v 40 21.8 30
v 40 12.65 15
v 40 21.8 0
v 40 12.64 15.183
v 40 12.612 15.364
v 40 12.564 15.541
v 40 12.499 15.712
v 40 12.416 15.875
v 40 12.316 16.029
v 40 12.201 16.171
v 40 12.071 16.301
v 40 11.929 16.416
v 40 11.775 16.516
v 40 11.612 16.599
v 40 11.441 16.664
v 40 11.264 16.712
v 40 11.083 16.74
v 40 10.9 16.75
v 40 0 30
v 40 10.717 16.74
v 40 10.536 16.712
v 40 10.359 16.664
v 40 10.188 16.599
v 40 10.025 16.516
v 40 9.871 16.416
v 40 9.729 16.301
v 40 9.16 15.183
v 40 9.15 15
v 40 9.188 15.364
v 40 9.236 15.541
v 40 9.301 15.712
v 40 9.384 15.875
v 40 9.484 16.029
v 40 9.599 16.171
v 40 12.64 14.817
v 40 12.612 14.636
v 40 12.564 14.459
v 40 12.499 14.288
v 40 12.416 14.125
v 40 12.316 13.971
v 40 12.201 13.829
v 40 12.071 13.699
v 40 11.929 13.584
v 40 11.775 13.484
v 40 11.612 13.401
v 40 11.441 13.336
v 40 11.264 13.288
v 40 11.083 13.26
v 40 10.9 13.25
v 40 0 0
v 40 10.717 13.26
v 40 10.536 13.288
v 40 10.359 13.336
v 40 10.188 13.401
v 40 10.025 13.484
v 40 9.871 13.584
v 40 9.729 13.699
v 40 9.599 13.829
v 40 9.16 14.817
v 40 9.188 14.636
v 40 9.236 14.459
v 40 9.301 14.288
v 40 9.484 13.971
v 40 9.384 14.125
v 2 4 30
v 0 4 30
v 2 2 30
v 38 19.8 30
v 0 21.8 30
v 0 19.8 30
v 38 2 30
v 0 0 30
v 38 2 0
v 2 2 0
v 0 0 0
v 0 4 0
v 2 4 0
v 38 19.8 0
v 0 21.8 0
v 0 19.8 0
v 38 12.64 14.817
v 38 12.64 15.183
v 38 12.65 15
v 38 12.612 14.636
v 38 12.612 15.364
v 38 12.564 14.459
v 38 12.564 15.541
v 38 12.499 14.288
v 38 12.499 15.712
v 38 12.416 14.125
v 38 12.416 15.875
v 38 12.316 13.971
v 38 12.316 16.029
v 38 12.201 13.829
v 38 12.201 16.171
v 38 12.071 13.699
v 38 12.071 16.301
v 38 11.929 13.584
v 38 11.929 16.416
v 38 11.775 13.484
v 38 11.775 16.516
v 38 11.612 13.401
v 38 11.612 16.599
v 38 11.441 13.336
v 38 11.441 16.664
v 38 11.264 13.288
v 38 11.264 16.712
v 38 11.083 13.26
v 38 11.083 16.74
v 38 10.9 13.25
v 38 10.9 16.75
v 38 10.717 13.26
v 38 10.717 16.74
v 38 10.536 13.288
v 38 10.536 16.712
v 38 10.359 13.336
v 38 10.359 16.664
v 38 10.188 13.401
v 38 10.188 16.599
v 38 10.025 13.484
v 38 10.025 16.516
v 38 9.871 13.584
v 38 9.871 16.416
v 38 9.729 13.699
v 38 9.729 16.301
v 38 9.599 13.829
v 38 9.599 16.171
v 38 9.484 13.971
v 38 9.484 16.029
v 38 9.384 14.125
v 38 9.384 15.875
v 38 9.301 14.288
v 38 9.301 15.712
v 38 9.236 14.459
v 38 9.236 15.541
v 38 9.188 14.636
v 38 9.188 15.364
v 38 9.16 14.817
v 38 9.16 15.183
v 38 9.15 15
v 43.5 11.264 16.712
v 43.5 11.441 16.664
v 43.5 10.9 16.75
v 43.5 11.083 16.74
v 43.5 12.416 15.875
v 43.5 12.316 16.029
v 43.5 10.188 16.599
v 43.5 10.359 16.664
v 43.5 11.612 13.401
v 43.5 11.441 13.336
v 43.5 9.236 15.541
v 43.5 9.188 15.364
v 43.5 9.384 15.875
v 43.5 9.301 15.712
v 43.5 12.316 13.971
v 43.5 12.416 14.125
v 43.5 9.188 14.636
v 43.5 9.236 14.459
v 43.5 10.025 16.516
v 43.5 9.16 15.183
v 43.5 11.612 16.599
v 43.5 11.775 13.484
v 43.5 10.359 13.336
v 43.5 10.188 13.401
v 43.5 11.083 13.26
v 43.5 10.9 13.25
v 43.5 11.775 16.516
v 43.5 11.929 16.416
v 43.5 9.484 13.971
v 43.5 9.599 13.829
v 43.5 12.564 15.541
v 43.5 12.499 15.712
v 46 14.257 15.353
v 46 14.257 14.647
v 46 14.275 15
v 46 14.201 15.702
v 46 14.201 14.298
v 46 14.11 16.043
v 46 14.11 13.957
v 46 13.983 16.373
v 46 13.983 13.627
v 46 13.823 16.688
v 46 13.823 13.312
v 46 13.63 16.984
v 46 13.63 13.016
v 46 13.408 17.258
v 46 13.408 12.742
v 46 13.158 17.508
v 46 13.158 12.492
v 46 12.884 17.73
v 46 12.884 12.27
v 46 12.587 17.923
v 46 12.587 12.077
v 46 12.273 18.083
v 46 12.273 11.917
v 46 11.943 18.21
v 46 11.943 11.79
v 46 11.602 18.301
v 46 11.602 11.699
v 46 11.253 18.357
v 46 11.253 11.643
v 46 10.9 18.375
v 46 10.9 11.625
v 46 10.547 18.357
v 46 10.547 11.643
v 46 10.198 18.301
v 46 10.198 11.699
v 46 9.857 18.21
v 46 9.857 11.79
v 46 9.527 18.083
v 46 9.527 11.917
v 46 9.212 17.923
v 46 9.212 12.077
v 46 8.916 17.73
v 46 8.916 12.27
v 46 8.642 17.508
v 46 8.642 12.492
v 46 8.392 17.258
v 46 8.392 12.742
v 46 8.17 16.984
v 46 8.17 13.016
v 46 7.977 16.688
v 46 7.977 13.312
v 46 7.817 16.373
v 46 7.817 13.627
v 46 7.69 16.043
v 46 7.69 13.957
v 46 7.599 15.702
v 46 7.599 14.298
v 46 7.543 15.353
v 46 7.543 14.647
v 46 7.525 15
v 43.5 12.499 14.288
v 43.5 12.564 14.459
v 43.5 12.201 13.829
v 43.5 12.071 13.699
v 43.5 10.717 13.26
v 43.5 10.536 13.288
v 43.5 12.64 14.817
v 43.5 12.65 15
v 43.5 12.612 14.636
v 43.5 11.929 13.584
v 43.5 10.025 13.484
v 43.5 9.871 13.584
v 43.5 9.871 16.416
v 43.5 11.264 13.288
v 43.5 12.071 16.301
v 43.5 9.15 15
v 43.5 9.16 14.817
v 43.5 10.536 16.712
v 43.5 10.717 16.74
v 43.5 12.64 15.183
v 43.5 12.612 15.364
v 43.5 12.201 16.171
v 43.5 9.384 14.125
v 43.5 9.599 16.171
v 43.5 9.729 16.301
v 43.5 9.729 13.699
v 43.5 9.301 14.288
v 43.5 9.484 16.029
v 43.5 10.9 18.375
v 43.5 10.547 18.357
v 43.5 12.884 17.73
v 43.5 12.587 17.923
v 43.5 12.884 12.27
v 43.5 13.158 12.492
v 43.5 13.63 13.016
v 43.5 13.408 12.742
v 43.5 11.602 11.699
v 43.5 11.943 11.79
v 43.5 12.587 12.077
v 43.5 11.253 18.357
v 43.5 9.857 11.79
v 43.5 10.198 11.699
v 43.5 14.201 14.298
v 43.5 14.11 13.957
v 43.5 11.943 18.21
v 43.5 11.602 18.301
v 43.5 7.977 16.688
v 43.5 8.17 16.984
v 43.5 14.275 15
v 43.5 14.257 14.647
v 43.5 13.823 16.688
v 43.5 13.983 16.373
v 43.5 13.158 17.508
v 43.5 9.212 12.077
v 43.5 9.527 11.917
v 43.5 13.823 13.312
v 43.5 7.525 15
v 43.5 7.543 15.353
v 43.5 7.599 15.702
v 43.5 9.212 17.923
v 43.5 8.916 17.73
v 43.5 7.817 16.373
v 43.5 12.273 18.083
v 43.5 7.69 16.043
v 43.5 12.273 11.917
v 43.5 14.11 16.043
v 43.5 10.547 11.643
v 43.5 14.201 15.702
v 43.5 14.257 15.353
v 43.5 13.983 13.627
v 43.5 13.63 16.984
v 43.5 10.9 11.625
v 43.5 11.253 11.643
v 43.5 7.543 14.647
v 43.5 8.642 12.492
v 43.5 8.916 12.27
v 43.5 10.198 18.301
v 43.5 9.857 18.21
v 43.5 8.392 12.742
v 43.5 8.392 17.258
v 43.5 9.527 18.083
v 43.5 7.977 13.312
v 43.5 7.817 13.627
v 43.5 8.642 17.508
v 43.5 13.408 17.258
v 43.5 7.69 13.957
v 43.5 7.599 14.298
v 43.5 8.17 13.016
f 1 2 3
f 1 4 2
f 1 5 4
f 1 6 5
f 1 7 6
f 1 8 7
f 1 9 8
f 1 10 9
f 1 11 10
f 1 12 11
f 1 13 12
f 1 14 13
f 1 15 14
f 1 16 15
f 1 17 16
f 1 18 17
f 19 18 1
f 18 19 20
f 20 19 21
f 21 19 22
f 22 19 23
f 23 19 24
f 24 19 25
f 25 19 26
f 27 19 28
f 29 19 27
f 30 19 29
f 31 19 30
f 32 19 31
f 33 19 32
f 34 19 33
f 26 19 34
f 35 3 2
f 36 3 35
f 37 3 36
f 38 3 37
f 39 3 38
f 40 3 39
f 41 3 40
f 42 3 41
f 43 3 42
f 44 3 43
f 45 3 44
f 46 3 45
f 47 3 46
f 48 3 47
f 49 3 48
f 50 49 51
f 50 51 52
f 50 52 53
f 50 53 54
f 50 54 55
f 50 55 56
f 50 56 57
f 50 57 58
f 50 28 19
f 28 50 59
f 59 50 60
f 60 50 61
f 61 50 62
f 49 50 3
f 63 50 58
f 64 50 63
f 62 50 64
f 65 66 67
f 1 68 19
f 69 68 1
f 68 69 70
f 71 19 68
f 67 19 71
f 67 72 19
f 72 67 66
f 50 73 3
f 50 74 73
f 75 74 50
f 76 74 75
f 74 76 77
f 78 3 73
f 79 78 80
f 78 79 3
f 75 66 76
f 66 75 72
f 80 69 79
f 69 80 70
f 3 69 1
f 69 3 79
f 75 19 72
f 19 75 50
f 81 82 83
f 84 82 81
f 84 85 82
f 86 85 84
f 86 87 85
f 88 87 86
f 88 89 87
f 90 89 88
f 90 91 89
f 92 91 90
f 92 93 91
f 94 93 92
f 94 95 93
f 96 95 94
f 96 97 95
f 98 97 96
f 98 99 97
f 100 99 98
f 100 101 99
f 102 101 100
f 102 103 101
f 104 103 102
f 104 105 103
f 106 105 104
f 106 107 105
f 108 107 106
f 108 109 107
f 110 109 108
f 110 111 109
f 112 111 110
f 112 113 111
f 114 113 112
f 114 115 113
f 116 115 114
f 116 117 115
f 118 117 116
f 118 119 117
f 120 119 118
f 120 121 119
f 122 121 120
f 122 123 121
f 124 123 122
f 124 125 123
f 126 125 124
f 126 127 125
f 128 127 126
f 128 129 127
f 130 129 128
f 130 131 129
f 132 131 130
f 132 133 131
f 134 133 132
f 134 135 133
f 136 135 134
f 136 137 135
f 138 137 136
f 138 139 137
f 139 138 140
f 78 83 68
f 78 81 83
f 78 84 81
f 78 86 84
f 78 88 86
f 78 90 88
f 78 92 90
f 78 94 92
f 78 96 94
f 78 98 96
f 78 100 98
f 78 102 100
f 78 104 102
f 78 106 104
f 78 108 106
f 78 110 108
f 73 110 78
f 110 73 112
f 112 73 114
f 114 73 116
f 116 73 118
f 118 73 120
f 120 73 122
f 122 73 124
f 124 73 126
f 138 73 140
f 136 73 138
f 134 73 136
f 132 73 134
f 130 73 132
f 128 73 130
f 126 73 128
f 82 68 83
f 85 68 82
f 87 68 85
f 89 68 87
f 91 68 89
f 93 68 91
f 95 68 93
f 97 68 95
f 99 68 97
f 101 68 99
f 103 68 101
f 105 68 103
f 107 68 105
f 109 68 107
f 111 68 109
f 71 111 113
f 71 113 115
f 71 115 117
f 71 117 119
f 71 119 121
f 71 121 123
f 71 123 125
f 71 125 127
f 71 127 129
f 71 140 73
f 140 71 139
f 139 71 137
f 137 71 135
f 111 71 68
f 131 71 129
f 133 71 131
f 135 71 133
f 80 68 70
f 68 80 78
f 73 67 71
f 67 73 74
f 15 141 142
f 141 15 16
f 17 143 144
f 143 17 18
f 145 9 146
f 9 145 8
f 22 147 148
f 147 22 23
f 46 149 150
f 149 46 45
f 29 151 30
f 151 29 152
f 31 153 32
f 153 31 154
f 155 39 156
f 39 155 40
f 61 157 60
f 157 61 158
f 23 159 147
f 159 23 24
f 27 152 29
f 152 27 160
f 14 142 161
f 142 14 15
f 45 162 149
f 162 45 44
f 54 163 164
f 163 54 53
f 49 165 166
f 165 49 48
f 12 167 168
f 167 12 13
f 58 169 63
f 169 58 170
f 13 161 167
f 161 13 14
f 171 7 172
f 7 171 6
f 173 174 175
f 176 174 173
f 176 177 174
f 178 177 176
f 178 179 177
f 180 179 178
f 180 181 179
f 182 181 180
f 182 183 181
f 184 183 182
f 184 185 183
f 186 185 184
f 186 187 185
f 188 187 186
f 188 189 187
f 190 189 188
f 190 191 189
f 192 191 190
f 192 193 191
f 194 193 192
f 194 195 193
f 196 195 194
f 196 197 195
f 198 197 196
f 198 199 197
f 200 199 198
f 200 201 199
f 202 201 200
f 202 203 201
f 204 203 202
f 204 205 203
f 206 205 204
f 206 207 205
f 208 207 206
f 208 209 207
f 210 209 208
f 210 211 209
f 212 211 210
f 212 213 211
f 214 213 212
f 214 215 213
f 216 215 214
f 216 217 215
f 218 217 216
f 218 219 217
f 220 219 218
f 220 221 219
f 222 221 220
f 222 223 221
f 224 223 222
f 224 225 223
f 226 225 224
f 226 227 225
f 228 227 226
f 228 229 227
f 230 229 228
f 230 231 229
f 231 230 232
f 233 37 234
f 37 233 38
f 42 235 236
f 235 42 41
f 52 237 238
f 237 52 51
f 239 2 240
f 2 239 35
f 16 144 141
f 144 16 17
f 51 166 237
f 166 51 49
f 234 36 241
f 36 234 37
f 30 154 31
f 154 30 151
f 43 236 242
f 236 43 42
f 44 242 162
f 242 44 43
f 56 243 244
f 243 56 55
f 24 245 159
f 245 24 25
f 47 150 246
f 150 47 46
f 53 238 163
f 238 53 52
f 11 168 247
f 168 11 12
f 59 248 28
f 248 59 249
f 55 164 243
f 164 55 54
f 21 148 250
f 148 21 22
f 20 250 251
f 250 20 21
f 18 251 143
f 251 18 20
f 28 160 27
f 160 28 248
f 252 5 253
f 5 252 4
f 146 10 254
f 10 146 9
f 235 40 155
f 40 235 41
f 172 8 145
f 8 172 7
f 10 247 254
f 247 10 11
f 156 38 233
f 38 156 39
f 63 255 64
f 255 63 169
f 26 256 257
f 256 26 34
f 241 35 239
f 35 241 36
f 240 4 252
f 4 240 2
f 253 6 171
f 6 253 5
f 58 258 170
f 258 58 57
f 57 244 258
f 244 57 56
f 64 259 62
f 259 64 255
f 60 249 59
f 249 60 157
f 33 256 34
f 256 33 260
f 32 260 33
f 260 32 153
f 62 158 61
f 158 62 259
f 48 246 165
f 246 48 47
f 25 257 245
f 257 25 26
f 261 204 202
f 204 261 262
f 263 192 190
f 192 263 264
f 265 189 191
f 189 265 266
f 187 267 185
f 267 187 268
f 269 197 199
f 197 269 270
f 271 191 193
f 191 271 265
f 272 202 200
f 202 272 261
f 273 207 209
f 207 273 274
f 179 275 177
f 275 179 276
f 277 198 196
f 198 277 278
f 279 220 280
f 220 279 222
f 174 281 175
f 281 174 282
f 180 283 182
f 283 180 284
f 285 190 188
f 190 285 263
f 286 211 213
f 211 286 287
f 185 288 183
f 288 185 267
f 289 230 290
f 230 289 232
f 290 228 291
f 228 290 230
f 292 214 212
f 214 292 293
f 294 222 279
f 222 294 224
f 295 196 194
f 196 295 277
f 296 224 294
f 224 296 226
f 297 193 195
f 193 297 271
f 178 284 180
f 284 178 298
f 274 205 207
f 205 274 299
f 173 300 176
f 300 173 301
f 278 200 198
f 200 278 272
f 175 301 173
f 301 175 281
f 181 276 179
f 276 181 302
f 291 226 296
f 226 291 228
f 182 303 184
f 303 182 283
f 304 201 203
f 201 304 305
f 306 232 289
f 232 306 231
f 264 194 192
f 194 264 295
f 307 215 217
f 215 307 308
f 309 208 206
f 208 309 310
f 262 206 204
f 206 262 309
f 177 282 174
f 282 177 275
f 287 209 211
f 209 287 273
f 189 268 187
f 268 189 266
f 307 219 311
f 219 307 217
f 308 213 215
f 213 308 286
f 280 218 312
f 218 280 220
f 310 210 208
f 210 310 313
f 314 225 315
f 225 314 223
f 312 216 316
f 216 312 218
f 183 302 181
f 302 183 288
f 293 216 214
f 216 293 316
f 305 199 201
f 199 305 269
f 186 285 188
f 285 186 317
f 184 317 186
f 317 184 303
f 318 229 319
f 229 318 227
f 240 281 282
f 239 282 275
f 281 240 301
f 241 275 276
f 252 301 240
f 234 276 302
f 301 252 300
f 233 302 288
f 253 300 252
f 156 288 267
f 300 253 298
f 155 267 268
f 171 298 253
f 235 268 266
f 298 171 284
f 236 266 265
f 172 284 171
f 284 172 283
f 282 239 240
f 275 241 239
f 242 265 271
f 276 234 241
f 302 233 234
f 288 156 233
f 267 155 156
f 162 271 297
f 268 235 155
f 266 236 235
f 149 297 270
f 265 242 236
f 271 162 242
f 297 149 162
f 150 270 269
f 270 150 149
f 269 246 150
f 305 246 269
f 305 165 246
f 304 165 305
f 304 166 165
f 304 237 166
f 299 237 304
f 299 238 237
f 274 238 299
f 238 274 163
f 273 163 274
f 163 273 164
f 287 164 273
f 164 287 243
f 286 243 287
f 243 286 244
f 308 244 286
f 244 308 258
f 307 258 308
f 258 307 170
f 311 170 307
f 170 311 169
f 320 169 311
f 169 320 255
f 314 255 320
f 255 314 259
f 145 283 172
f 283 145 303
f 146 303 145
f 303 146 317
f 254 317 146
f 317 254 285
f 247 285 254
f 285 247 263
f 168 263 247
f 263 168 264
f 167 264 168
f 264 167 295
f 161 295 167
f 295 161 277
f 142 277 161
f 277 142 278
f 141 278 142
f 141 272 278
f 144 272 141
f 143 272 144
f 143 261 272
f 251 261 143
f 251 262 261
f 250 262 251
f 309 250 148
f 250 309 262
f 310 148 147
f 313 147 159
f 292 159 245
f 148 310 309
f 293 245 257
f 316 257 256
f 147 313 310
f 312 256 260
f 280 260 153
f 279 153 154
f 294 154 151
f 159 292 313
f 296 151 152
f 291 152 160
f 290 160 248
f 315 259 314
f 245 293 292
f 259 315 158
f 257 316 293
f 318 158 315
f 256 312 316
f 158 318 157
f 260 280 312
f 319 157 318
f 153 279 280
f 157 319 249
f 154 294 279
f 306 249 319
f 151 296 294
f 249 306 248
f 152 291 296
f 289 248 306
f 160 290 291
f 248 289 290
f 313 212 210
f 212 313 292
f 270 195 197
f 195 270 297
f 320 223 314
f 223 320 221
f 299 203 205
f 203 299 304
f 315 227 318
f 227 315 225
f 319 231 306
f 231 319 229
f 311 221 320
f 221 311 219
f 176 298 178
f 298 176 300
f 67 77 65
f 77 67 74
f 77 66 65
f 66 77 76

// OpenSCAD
$fn=60;
width=17.8; // Thickness of wood
height = 30;  // left to  right
length = 40; // how deep
thickness = 2;
difference()
{
    cube([length,width + thickness *2,height]);
    translate([-thickness,thickness,-1])
    cube([length,width,height+2]);
}    


translate([46,width/2 + thickness ,height/2])
rotate([0,-90,0])
cylinder(8, d=3.5);

#translate([46,width/2 + thickness ,height/2])
rotate([0,-90,0])
cylinder(2.5, d=6.75);

cube([thickness,thickness *2,height]);
